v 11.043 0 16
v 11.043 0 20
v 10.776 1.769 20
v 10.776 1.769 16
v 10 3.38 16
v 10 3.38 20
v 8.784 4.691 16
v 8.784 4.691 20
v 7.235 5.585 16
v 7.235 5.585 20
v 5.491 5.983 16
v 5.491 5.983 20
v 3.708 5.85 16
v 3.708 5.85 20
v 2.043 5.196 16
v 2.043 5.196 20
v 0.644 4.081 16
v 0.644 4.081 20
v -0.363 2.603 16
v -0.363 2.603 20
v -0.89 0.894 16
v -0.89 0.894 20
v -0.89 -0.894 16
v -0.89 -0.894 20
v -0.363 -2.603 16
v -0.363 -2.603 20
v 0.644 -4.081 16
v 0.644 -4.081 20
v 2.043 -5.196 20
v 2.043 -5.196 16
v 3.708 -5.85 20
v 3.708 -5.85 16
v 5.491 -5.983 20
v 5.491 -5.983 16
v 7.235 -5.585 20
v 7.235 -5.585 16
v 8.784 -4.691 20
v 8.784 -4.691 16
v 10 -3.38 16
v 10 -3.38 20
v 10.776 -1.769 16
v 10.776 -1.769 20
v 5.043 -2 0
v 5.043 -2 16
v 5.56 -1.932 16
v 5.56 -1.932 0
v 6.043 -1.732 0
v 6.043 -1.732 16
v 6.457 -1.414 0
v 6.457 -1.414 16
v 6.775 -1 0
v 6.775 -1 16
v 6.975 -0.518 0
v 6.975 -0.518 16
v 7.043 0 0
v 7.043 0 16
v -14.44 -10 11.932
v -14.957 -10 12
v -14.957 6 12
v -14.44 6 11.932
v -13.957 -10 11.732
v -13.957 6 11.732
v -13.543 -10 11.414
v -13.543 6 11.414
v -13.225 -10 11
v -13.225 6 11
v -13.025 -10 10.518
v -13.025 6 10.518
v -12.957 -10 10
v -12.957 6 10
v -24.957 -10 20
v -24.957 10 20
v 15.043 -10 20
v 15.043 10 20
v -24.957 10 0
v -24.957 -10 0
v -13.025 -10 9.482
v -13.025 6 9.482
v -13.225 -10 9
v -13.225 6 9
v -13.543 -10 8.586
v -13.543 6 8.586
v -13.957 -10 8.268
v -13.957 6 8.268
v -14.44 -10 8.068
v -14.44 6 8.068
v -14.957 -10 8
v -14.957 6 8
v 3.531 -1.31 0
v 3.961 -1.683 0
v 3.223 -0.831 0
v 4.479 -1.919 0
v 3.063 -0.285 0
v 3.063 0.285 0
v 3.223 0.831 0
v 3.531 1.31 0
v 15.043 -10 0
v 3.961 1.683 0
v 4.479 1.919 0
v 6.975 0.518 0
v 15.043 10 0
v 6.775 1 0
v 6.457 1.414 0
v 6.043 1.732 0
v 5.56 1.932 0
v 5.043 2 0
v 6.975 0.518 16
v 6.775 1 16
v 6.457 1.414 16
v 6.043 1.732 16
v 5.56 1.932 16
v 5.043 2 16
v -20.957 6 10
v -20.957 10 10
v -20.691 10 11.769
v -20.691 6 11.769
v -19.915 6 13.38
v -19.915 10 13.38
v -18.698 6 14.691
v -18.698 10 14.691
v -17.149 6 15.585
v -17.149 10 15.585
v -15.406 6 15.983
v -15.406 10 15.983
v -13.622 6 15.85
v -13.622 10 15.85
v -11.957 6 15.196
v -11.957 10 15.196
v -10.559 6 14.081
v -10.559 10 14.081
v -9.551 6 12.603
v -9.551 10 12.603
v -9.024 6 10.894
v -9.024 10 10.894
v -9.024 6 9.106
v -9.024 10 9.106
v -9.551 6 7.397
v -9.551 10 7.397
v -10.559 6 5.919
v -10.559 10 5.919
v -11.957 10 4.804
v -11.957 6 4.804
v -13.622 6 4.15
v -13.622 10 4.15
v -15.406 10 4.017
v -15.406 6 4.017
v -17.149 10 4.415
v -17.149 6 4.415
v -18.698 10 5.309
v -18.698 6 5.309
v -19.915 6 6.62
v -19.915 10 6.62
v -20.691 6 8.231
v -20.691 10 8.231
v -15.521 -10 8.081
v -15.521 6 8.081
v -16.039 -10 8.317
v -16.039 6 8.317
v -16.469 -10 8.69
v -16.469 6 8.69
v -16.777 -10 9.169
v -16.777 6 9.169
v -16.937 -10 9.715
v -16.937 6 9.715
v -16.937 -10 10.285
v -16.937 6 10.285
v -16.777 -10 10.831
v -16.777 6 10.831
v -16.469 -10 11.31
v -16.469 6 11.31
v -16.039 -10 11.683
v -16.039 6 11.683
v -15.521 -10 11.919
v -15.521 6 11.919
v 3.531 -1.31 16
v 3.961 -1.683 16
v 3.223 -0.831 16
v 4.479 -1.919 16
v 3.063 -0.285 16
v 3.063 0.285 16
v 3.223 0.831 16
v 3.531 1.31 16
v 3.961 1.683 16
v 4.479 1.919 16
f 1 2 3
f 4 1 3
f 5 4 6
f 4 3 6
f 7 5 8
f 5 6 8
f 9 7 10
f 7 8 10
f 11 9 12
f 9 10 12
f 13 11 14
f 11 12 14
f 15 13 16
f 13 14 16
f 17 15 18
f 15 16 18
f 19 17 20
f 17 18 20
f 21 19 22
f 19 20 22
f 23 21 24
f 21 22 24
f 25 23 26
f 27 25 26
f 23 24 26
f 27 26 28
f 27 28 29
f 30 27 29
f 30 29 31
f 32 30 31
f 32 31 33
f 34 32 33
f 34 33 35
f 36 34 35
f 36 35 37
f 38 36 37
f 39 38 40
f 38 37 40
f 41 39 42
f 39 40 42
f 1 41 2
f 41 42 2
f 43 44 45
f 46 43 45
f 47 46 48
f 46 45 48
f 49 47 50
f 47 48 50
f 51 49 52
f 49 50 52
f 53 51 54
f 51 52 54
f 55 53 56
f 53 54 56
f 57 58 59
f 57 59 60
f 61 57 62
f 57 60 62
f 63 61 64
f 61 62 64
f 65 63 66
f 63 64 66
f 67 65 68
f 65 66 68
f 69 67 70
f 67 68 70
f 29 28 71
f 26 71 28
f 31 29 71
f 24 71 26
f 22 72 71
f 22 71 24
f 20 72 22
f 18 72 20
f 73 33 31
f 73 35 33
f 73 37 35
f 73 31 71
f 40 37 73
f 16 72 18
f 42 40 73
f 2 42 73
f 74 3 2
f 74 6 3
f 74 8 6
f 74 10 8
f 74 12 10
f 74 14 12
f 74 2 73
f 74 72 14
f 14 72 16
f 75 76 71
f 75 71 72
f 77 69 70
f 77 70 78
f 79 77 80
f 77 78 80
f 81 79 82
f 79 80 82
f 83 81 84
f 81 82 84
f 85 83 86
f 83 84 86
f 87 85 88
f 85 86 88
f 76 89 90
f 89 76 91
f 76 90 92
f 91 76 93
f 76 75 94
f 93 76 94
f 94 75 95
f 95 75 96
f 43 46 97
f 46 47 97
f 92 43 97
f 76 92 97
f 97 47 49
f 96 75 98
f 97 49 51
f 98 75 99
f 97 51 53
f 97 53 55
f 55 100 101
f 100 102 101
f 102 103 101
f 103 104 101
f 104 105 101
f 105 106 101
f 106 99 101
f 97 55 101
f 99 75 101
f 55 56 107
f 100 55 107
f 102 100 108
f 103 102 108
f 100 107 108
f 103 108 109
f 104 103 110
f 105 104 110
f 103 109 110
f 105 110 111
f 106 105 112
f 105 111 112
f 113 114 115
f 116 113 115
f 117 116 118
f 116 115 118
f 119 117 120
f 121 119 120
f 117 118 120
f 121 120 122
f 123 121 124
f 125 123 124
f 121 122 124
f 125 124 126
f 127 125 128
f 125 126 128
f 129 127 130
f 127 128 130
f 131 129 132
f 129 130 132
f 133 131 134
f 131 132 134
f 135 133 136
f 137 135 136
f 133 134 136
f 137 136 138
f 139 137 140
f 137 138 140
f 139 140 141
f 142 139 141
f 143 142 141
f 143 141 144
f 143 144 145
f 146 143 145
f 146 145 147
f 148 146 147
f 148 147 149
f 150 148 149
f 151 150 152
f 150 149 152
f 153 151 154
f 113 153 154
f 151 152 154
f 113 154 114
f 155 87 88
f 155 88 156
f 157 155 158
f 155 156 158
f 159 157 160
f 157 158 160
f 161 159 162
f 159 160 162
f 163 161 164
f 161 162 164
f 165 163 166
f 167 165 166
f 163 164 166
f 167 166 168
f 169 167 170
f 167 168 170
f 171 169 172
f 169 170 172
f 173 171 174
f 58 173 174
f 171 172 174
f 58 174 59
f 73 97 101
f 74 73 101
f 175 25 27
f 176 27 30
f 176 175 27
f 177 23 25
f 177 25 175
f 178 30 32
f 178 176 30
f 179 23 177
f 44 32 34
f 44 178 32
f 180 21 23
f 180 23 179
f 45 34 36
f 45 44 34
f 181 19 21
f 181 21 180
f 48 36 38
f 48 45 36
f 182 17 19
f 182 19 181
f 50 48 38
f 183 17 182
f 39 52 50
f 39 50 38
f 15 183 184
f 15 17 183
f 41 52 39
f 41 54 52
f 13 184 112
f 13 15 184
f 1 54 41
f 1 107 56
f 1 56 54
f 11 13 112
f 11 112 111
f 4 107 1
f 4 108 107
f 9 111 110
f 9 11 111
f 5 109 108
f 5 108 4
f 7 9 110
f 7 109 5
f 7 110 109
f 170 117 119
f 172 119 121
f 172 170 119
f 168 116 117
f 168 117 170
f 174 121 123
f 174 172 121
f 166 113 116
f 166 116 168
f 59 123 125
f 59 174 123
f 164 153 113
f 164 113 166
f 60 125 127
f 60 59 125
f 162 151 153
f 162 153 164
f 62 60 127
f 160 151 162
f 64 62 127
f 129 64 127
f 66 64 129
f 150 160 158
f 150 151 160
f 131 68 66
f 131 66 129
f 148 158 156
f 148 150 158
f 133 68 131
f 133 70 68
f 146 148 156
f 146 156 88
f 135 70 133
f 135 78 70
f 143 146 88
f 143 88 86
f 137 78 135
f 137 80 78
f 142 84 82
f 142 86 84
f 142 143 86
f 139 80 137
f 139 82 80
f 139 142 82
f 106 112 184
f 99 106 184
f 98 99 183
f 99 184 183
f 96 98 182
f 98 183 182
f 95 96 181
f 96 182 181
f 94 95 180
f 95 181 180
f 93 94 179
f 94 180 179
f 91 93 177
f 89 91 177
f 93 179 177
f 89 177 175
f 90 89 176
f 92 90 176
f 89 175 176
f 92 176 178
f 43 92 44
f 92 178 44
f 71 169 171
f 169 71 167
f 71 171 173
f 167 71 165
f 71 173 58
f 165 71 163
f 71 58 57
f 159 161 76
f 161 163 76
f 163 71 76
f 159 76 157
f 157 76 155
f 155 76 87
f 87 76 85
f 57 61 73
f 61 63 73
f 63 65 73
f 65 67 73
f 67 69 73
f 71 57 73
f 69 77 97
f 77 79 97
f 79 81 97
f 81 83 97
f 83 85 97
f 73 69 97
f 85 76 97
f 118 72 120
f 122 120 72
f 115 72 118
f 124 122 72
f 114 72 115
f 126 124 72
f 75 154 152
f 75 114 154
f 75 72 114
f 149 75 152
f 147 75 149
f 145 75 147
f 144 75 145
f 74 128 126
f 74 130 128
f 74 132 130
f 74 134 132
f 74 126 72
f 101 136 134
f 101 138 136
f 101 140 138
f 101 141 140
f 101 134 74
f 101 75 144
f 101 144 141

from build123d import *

# Parameters (mm, degrees)
SKETCH1_W           = 40
SKETCH1_H           = 20
BOX_DEPTH           = 20
SKETCH10_R          = 6
SIDE_CUT_DEPTH      = 4
CUT_EXTRUDE10_DEPTH = 20
CUT_EXTRUDE11_DEPTH = 4
CUT_EXTRUDE12_DEPTH = 20


with BuildPart() as part:
    # Sketch1 → Box (new body)
    with BuildSketch(Plane.XY):
        with Locations((-4.957264957, 0)):
            Rectangle(SKETCH1_W, SKETCH1_H)
    extrude(amount=BOX_DEPTH)

    # Sketch10 → Side Cut (cut)
    with BuildSketch(Plane.XY.offset(20)):
        with Locations((5.042735043, 0)):
            Circle(SKETCH10_R)
    extrude(amount=-SIDE_CUT_DEPTH, mode=Mode.SUBTRACT)

    # Sketch11 → Cut-Extrude10 (cut)
    with BuildSketch(Plane.XY.offset(20)):
        with BuildLine():
            ThreePointArc((7.042735043, 0), (6.456948605, 1.414213562), (5.042735043, 2))
            Line((5.042735043, 2), (5.042735043, -2))
            ThreePointArc((5.042735043, -2), (6.456948605, -1.414213562), (7.042735043, 0))
        make_face()
        with BuildLine():
            Line((5.042735043, -2), (5.042735043, 2))
            ThreePointArc((5.042735043, 2), (3.042735043, 0), (5.042735043, -2))
        make_face()
    extrude(amount=-CUT_EXTRUDE10_DEPTH, mode=Mode.SUBTRACT)

    # Sketch12 → Cut-Extrude11 (cut)
    with BuildSketch(Plane(origin=(0, 10, 0), x_dir=(1, 0, 0), z_dir=(0, 1, 0))):
        with BuildLine():
            ThreePointArc((-8.957264957, -10), (-14.957264957, -4), (-20.957264957, -10))
            Line((-20.957264957, -10), (-8.957264957, -10))
        make_face()
        with BuildLine():
            Line((-8.957264957, -10), (-20.957264957, -10))
            ThreePointArc((-20.957264957, -10), (-14.957264957, -16), (-8.957264957, -10))
        make_face()
    extrude(amount=-CUT_EXTRUDE11_DEPTH, mode=Mode.SUBTRACT)

    # Sketch13 → Cut-Extrude12 (cut)
    with BuildSketch(Plane(origin=(0, 10, 0), x_dir=(1, 0, 0), z_dir=(0, 1, 0))):
        with BuildLine():
            ThreePointArc((-12.957264957, -10), (-13.543051395, -8.585786438), (-14.957264957, -8))
            Line((-14.957264957, -8), (-14.957264957, -12))
            ThreePointArc((-14.957264957, -12), (-13.543051395, -11.414213562), (-12.957264957, -10))
        make_face()
        with BuildLine():
            Line((-14.957264957, -12), (-14.957264957, -8))
            ThreePointArc((-14.957264957, -8), (-16.957264957, -10), (-14.957264957, -12))
        make_face()
    extrude(amount=-CUT_EXTRUDE12_DEPTH, mode=Mode.SUBTRACT)


solid = part.part
